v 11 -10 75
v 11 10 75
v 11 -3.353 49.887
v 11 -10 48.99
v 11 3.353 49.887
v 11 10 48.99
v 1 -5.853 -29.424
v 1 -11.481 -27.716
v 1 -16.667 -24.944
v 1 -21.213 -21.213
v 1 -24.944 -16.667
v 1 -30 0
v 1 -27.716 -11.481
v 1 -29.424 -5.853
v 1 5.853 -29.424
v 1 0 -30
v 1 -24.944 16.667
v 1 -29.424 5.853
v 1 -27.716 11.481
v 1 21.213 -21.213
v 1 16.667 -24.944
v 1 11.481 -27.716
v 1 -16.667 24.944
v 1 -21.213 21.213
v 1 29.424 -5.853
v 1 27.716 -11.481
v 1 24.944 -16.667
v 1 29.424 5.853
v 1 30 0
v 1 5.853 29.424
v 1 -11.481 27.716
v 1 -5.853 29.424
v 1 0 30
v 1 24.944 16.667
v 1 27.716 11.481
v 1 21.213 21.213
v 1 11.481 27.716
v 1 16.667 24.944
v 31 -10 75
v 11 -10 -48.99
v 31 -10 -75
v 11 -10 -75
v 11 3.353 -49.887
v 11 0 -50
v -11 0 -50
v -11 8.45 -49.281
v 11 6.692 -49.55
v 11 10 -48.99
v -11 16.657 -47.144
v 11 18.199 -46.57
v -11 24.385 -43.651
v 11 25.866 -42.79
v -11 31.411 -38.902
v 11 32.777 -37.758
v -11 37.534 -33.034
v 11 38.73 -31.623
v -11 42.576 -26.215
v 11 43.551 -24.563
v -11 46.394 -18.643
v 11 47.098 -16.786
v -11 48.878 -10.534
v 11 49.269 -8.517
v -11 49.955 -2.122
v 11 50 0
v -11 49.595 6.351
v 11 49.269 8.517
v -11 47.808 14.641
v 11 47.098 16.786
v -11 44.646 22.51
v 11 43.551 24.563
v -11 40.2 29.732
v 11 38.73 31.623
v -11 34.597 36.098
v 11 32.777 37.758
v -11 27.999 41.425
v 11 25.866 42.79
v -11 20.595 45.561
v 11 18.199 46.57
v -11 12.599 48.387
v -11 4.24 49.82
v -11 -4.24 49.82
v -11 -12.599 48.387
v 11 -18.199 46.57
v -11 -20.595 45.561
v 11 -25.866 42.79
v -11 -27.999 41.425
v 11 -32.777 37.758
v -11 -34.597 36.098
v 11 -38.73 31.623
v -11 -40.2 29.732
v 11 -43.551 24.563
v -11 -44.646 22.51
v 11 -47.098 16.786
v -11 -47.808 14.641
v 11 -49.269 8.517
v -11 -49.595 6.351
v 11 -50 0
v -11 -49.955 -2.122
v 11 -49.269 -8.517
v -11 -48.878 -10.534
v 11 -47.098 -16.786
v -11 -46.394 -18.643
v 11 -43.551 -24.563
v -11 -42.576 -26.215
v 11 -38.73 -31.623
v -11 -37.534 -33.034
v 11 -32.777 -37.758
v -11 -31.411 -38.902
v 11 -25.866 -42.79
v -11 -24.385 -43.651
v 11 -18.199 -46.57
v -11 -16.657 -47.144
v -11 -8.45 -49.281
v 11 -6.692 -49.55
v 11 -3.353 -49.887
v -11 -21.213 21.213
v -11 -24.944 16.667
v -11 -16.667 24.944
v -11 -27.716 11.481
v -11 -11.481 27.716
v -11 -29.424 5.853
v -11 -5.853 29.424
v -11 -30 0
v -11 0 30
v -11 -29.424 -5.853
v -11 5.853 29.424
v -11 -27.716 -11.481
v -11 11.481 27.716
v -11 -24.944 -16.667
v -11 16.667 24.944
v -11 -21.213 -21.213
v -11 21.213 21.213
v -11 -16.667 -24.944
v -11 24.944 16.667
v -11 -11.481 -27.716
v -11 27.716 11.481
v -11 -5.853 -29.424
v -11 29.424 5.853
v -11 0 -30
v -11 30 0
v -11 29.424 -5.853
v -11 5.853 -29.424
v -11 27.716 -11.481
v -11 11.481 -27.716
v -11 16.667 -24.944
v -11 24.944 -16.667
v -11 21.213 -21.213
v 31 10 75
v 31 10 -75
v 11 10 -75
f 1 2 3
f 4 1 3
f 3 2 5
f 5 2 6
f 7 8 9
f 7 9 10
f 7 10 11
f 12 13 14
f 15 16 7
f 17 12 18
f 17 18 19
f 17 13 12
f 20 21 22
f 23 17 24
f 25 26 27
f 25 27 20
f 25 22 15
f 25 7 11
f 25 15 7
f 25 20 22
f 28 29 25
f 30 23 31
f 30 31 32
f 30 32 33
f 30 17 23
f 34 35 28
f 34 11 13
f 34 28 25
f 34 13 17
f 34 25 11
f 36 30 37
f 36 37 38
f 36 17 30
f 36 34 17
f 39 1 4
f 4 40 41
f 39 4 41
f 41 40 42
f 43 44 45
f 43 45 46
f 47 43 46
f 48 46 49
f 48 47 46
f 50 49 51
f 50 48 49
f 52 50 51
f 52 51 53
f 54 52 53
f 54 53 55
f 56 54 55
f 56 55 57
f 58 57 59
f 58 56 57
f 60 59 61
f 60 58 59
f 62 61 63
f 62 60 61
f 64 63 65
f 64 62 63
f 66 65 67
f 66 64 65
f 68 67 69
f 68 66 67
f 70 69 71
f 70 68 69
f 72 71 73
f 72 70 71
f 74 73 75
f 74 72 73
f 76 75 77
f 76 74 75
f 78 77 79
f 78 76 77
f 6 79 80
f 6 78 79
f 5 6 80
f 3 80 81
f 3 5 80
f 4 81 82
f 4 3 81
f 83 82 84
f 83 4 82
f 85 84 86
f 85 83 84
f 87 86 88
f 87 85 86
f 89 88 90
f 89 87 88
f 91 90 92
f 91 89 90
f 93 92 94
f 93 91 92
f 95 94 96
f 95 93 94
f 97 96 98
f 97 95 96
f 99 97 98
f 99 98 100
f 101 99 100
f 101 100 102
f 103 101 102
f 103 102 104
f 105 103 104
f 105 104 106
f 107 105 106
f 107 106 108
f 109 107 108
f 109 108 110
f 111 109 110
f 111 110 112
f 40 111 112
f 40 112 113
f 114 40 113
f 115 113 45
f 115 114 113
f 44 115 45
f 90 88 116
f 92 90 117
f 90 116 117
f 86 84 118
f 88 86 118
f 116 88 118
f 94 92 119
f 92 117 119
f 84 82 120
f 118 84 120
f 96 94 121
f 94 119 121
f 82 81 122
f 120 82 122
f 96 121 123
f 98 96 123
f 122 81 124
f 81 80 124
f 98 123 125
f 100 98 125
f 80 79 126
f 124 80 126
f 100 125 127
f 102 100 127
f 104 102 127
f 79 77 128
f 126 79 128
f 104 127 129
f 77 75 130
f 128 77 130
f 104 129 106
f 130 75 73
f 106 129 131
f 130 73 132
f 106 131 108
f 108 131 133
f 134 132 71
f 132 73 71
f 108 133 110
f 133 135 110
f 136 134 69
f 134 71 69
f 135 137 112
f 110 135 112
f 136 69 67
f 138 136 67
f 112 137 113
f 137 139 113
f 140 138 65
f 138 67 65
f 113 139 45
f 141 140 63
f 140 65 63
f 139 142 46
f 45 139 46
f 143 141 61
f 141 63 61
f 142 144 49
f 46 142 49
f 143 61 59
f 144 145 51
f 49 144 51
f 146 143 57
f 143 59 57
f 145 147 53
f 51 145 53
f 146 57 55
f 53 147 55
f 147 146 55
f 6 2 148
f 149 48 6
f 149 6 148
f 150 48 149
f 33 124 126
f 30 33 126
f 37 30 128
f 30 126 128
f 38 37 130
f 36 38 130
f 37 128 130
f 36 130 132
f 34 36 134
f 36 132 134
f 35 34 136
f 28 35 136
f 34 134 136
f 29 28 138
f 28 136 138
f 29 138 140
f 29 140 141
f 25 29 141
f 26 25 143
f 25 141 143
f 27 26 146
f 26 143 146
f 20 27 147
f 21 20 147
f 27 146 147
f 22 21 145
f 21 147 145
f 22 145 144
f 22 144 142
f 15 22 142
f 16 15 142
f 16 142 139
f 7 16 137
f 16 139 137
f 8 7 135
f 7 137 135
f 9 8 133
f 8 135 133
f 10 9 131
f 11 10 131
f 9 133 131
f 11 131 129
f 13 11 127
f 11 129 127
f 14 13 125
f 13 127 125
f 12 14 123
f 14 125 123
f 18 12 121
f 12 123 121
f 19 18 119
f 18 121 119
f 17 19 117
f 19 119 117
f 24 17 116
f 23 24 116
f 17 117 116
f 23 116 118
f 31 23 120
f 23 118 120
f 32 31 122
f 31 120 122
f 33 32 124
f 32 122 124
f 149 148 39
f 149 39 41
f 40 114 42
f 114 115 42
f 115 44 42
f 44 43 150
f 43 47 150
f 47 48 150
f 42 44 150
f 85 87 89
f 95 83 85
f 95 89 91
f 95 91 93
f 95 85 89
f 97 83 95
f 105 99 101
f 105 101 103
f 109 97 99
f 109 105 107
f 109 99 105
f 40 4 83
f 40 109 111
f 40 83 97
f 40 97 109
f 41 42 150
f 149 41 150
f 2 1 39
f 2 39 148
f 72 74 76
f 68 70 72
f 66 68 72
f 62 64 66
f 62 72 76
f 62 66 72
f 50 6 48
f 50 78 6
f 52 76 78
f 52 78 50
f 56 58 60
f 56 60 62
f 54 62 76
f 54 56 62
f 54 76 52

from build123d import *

# Parameters (mm, degrees)
SKETCH1_R           = 50
BOSS_EXTRUDE1_DEPTH = 11
SKETCH2_R           = 30
CUT_EXTRUDE1_DEPTH  = 12
SKETCH3_W           = 150
SKETCH3_H           = 20
BOSS_EXTRUDE2_DEPTH = 20


with BuildPart() as part:
    # Sketch1 → Boss-Extrude1 (new, symmetric)
    with BuildSketch(Plane(origin=(0, 0, 0), x_dir=(0, 0, -1), z_dir=(1, 0, 0))):
        Circle(SKETCH1_R)
    extrude(amount=BOSS_EXTRUDE1_DEPTH, both=True)

    # Sketch2 → Cut-Extrude1 (cut)
    with BuildSketch(Plane.ZY.offset(11)):
        Circle(SKETCH2_R)
    extrude(amount=-CUT_EXTRUDE1_DEPTH, mode=Mode.SUBTRACT)

    # Sketch3 → Boss-Extrude2 (add)
    with BuildSketch(Plane(origin=(11, 0, 0), x_dir=(0, 0, -1), z_dir=(1, 0, 0))):
        Rectangle(SKETCH3_W, SKETCH3_H)
    extrude(amount=BOSS_EXTRUDE2_DEPTH)


solid = part.part
